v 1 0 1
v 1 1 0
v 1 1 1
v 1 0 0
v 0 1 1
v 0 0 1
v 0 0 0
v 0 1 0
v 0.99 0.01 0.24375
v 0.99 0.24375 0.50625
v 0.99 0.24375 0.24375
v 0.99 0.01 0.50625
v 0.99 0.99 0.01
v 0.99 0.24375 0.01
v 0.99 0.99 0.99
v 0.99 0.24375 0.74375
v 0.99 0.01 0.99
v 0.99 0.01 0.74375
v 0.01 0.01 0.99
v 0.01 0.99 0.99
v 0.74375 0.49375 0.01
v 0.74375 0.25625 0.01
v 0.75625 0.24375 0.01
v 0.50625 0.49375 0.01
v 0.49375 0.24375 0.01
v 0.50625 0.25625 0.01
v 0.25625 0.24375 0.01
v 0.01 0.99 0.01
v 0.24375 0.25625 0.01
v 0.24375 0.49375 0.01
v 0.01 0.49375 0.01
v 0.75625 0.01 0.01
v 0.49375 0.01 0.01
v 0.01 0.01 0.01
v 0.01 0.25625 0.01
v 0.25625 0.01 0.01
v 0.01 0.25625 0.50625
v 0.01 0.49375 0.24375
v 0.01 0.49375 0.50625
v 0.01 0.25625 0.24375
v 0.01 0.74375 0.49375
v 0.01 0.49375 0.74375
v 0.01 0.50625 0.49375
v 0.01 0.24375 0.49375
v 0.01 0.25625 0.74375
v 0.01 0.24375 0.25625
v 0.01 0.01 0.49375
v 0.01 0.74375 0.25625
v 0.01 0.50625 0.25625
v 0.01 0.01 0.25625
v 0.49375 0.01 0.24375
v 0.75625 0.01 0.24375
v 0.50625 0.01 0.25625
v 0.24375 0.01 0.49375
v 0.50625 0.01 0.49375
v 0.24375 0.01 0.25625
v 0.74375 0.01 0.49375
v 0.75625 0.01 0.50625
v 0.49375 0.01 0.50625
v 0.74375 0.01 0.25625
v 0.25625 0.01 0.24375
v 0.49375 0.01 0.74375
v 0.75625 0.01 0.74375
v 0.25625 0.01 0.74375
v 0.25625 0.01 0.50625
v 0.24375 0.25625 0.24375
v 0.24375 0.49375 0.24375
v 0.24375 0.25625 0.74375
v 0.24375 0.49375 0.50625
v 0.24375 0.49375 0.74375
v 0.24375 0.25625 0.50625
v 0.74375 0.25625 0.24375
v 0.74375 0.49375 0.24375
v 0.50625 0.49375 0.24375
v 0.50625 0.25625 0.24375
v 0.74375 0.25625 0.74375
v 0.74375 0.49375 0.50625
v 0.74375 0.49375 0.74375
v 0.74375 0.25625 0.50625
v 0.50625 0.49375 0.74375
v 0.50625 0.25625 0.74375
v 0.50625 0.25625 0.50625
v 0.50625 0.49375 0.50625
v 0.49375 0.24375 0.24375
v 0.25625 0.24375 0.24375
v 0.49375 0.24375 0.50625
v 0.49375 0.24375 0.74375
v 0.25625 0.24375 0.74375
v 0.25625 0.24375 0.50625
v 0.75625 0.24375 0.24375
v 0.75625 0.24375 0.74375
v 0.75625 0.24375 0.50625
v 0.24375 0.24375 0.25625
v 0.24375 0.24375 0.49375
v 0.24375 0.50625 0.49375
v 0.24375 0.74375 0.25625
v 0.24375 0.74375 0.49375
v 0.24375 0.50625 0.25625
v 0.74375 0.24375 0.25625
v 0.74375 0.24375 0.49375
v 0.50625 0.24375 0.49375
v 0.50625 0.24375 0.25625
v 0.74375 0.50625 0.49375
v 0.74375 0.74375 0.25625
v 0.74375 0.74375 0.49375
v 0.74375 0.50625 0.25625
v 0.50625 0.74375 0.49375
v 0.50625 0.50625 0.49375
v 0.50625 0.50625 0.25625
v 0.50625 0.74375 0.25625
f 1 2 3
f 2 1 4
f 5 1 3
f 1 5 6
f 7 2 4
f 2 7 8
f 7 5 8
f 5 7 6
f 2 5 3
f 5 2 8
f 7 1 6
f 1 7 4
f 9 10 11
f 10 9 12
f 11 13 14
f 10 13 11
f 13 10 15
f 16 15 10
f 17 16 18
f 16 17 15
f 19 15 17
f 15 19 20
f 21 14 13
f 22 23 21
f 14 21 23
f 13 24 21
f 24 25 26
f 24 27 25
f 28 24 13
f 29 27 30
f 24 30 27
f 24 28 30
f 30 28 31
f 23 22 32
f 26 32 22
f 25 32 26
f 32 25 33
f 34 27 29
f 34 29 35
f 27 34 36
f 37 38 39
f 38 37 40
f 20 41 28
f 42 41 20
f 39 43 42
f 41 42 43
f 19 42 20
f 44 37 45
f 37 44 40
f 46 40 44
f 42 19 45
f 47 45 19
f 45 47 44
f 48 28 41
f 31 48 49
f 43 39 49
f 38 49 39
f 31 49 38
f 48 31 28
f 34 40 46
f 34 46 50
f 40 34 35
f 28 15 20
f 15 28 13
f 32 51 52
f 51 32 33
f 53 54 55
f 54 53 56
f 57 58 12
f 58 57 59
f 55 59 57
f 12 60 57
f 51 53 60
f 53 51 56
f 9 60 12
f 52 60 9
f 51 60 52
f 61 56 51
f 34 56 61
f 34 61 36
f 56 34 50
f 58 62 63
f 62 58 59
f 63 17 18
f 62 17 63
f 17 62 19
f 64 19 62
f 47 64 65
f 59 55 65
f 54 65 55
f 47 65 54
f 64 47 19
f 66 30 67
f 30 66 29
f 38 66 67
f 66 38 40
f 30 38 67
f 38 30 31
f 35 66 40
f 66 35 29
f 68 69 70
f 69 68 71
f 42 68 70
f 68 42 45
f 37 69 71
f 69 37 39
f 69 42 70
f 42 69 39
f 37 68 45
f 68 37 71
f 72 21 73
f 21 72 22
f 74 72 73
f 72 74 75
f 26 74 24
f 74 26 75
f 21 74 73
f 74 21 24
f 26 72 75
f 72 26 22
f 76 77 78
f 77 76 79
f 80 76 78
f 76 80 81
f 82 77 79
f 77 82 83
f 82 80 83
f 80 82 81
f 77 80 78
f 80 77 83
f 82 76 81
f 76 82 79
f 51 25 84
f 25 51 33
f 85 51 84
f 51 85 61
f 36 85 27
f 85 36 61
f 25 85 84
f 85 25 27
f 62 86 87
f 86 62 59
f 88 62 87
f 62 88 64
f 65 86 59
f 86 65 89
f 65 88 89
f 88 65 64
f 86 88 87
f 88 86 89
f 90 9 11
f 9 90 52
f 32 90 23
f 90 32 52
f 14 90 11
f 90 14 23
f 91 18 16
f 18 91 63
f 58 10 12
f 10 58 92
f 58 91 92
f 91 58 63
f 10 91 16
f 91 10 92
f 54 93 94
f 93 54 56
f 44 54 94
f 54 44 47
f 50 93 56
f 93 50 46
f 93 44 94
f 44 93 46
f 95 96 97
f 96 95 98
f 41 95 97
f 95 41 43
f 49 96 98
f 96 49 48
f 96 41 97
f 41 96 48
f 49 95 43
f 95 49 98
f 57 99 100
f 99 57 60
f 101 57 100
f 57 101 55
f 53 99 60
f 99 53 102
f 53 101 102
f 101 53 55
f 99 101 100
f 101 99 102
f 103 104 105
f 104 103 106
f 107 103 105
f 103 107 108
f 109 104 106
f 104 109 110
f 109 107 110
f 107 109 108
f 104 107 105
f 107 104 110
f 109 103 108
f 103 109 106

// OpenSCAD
translate([0.125, 0.375, 0.125]) color([0.1977229983916683, 0.036370797334404625, 0.13840798504488894]) cube([0.2375, 0.2375, 0.2375], center=true);
translate([0.125, 0.375, 0.625]) color([0.695134065044521, 0.2654011745990712, 0.4635417367699751]) cube([0.2375, 0.2375, 0.2375], center=true);
translate([0.625, 0.375, 0.125]) color([0.14067843926211876, 0.3233092624720053, 0.6766209265725885]) cube([0.2375, 0.2375, 0.2375], center=true);
translate([0.625, 0.375, 0.625]) color([0.5598941248919586, 0.2674263193966361, 0.7715367321750608]) cube([0.2375, 0.2375, 0.2375], center=true);
translate([0.375, 0.125, 0.125]) color([0.7775867750177572, 0.3358457771023752, 0.7984986383285079]) cube([0.2375, 0.2375, 0.2375], center=true);
translate([0.375, 0.125, 0.625]) color([0.3608344962449672, 0.130636609727118, 0.1470050456404287]) cube([0.2375, 0.2375, 0.2375], center=true);
translate([0.875, 0.125, 0.125]) color([0.5817121628313788, 0.46286602772829477, 0.8824527290015699]) cube([0.2375, 0.2375, 0.2375], center=true);
translate([0.875, 0.125, 0.625]) color([0.1201105517589024, 0.1938197880719691, 0.4695931850983104]) cube([0.2375, 0.2375, 0.2375], center=true);
translate([0.125, 0.125, 0.375]) color([0.14078313852784263, 0.6451769219884874, 0.9811903017448982]) cube([0.2375, 0.2375, 0.2375], center=true);
translate([0.125, 0.625, 0.375]) color([0.8740229692652243, 0.6541461711493592, 0.21289315855754942]) cube([0.2375, 0.2375, 0.2375], center=true);
translate([0.625, 0.125, 0.375]) color([0.9328418457966335, 0.42345059226773774, 0.5012376899041451]) cube([0.2375, 0.2375, 0.2375], center=true);
translate([0.625, 0.625, 0.375]) color([0.5811541702347708, 0.2791891573101454, 0.2092311813057095]) cube([0.2375, 0.2375, 0.2375], center=true);
color([0.3,0.3,0.3,0.3]) difference() { cube([1,1,1]); translate([0.01,0.01,0.01]) cube([0.98,0.98,0.98]); }
